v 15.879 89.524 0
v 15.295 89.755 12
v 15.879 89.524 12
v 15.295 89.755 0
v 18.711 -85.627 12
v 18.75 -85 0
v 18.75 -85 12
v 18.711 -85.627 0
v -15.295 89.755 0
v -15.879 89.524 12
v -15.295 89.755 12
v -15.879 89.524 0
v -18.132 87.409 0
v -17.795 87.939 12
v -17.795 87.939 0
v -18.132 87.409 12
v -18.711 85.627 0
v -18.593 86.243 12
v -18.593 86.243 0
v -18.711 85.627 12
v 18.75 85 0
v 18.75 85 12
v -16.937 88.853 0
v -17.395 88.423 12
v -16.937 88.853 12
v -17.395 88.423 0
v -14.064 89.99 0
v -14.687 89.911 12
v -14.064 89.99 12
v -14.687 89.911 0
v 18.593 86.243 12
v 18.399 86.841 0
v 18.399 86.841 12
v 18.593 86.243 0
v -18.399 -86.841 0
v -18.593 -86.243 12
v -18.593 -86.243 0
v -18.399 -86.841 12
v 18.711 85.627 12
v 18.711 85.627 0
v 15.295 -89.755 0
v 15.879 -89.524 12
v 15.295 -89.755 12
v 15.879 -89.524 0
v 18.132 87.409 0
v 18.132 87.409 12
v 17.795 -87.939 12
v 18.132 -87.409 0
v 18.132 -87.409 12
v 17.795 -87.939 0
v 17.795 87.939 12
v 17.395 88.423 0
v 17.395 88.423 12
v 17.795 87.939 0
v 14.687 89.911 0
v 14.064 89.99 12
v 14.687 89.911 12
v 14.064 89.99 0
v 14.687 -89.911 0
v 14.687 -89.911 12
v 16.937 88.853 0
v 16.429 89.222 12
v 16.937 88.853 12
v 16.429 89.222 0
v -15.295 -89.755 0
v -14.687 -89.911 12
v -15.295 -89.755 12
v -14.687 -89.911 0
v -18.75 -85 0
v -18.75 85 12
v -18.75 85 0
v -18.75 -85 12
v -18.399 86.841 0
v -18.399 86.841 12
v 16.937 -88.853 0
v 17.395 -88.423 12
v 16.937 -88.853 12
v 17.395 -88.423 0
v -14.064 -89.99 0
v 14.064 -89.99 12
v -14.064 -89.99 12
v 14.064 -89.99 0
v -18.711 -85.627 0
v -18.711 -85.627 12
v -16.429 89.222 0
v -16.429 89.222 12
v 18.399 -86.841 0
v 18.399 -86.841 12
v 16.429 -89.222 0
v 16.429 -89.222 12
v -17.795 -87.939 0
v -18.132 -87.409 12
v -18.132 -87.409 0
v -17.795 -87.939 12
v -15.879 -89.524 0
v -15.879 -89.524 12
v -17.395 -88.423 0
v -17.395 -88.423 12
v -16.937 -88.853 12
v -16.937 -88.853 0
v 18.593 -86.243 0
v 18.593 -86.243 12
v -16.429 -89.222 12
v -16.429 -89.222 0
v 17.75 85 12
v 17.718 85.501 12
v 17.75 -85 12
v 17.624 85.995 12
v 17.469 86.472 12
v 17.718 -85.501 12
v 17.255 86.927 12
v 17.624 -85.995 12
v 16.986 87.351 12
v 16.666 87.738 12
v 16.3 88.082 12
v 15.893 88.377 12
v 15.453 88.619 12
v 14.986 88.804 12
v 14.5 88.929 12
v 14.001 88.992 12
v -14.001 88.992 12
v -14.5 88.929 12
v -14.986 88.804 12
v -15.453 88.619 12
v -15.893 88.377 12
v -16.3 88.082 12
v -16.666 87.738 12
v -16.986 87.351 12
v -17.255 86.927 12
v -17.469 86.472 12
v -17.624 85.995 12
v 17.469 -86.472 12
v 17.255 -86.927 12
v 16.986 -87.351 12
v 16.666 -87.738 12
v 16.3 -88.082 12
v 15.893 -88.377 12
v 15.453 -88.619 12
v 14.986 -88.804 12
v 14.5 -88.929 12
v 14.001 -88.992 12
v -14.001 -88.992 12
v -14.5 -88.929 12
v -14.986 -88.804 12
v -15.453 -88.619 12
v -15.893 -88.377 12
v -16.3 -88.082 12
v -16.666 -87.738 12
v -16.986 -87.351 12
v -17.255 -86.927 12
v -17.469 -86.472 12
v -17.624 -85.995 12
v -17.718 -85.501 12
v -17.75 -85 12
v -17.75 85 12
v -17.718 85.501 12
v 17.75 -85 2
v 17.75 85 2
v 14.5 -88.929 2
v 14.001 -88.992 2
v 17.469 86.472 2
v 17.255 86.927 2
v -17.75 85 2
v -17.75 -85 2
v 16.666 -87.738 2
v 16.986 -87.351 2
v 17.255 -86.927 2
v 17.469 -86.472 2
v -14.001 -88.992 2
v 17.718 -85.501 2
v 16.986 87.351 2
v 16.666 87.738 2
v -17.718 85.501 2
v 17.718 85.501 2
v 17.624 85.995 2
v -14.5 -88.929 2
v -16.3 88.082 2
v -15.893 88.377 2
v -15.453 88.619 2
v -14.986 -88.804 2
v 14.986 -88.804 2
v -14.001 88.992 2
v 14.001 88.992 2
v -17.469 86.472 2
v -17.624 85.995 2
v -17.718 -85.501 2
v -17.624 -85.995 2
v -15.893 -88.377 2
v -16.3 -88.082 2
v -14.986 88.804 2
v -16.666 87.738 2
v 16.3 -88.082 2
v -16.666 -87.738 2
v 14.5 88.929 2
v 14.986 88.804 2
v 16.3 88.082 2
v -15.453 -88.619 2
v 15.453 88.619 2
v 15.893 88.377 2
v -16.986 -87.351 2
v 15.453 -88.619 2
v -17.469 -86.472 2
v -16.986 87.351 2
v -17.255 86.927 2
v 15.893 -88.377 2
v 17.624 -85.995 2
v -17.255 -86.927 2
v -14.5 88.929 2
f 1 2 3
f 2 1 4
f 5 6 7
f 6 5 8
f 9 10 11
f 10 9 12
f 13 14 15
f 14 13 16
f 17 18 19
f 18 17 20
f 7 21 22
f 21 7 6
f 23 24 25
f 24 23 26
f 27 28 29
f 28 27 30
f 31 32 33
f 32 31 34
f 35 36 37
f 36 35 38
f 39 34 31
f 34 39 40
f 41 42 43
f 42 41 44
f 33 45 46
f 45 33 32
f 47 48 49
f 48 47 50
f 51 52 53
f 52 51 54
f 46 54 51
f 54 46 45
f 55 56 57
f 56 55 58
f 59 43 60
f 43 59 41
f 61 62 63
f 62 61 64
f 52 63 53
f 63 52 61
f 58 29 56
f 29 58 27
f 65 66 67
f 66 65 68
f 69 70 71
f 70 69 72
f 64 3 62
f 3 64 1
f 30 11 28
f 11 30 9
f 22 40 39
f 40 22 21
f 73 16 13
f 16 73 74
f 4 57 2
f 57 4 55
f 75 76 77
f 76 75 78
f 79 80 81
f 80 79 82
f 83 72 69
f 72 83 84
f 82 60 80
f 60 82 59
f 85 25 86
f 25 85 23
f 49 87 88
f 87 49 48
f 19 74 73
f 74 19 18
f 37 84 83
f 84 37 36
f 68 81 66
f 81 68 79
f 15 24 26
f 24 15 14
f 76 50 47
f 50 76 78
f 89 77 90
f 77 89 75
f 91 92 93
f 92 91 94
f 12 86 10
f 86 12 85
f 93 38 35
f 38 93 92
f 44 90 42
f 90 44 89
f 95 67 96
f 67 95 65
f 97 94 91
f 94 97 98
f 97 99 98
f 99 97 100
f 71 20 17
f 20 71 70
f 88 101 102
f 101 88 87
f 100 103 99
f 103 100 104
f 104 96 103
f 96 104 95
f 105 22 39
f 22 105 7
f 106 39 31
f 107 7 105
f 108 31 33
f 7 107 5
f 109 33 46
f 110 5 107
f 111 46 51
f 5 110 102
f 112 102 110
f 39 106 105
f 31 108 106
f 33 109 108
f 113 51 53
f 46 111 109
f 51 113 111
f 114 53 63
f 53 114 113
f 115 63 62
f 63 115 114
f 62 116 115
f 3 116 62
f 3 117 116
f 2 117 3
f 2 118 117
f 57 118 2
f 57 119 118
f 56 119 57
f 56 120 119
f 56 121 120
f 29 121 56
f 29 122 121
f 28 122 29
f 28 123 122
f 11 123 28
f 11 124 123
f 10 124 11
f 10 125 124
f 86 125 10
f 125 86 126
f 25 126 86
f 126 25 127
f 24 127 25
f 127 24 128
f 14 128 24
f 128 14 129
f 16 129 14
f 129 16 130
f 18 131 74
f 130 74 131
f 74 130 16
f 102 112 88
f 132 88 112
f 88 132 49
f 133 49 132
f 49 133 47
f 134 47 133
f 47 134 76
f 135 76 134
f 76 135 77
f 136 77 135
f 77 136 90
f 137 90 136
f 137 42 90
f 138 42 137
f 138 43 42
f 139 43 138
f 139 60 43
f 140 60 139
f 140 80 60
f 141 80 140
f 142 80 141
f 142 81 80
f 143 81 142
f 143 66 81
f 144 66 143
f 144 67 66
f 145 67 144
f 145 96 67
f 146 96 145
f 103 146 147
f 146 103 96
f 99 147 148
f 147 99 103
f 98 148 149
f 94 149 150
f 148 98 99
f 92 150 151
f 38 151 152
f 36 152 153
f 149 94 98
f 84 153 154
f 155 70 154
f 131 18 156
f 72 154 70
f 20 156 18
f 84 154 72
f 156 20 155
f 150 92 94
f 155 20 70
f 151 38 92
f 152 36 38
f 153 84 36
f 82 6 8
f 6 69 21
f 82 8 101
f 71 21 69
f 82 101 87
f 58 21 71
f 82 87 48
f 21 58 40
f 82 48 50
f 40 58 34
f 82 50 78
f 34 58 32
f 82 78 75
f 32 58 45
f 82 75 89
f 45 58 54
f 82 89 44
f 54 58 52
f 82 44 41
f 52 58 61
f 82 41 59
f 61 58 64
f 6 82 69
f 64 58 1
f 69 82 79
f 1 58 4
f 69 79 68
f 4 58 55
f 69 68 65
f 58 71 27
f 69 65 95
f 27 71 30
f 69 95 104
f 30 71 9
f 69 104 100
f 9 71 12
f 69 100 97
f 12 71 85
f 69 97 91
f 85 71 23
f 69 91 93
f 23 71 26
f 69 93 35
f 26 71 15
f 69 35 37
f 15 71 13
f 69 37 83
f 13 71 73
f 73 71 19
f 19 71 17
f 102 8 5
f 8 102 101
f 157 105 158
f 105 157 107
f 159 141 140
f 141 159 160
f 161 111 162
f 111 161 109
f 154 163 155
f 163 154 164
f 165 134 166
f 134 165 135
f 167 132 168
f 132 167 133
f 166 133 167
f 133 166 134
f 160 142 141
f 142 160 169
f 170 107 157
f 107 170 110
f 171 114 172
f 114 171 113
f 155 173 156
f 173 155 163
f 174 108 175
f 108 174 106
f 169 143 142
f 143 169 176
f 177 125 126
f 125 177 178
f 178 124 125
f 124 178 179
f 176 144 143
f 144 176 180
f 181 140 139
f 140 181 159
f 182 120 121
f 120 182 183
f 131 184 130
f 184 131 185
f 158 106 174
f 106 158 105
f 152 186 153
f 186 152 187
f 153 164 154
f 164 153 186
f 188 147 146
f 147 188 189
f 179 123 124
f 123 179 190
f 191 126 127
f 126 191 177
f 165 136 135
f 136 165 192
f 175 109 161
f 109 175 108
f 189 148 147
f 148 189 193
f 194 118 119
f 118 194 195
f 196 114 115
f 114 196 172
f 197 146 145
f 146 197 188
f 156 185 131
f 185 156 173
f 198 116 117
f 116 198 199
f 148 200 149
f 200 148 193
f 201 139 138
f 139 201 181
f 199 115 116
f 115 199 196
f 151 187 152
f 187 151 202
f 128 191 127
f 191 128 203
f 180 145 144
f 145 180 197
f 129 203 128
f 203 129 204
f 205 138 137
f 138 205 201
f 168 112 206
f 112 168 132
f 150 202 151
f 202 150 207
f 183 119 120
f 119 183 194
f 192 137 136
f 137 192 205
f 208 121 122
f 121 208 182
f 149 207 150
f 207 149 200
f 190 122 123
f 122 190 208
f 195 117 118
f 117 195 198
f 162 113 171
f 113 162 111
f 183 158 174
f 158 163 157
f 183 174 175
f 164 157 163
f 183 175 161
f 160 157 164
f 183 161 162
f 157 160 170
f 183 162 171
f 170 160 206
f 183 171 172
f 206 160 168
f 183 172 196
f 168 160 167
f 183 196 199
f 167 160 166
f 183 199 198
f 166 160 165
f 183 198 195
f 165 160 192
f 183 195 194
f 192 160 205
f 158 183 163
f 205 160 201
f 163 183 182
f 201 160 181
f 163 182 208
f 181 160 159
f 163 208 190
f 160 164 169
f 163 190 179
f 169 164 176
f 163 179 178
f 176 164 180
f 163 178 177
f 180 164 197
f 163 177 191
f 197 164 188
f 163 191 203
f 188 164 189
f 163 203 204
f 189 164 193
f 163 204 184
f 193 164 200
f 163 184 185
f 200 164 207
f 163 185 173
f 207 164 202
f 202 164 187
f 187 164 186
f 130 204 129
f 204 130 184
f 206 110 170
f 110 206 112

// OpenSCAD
$fn = 50;


difference() {
	union() {
		hull() {
			translate(v = [-13.7500000000, 85.0000000000, 0]) {
				cylinder(h = 12, r = 5);
			}
			translate(v = [13.7500000000, 85.0000000000, 0]) {
				cylinder(h = 12, r = 5);
			}
			translate(v = [-13.7500000000, -85.0000000000, 0]) {
				cylinder(h = 12, r = 5);
			}
			translate(v = [13.7500000000, -85.0000000000, 0]) {
				cylinder(h = 12, r = 5);
			}
		}
	}
	union() {
		translate(v = [0, 0, 2]) {
			hull() {
				translate(v = [-13.7500000000, 85.0000000000, 0]) {
					cylinder(h = 10, r = 4);
				}
				translate(v = [13.7500000000, 85.0000000000, 0]) {
					cylinder(h = 10, r = 4);
				}
				translate(v = [-13.7500000000, -85.0000000000, 0]) {
					cylinder(h = 10, r = 4);
				}
				translate(v = [13.7500000000, -85.0000000000, 0]) {
					cylinder(h = 10, r = 4);
				}
			}
		}
	}
}
